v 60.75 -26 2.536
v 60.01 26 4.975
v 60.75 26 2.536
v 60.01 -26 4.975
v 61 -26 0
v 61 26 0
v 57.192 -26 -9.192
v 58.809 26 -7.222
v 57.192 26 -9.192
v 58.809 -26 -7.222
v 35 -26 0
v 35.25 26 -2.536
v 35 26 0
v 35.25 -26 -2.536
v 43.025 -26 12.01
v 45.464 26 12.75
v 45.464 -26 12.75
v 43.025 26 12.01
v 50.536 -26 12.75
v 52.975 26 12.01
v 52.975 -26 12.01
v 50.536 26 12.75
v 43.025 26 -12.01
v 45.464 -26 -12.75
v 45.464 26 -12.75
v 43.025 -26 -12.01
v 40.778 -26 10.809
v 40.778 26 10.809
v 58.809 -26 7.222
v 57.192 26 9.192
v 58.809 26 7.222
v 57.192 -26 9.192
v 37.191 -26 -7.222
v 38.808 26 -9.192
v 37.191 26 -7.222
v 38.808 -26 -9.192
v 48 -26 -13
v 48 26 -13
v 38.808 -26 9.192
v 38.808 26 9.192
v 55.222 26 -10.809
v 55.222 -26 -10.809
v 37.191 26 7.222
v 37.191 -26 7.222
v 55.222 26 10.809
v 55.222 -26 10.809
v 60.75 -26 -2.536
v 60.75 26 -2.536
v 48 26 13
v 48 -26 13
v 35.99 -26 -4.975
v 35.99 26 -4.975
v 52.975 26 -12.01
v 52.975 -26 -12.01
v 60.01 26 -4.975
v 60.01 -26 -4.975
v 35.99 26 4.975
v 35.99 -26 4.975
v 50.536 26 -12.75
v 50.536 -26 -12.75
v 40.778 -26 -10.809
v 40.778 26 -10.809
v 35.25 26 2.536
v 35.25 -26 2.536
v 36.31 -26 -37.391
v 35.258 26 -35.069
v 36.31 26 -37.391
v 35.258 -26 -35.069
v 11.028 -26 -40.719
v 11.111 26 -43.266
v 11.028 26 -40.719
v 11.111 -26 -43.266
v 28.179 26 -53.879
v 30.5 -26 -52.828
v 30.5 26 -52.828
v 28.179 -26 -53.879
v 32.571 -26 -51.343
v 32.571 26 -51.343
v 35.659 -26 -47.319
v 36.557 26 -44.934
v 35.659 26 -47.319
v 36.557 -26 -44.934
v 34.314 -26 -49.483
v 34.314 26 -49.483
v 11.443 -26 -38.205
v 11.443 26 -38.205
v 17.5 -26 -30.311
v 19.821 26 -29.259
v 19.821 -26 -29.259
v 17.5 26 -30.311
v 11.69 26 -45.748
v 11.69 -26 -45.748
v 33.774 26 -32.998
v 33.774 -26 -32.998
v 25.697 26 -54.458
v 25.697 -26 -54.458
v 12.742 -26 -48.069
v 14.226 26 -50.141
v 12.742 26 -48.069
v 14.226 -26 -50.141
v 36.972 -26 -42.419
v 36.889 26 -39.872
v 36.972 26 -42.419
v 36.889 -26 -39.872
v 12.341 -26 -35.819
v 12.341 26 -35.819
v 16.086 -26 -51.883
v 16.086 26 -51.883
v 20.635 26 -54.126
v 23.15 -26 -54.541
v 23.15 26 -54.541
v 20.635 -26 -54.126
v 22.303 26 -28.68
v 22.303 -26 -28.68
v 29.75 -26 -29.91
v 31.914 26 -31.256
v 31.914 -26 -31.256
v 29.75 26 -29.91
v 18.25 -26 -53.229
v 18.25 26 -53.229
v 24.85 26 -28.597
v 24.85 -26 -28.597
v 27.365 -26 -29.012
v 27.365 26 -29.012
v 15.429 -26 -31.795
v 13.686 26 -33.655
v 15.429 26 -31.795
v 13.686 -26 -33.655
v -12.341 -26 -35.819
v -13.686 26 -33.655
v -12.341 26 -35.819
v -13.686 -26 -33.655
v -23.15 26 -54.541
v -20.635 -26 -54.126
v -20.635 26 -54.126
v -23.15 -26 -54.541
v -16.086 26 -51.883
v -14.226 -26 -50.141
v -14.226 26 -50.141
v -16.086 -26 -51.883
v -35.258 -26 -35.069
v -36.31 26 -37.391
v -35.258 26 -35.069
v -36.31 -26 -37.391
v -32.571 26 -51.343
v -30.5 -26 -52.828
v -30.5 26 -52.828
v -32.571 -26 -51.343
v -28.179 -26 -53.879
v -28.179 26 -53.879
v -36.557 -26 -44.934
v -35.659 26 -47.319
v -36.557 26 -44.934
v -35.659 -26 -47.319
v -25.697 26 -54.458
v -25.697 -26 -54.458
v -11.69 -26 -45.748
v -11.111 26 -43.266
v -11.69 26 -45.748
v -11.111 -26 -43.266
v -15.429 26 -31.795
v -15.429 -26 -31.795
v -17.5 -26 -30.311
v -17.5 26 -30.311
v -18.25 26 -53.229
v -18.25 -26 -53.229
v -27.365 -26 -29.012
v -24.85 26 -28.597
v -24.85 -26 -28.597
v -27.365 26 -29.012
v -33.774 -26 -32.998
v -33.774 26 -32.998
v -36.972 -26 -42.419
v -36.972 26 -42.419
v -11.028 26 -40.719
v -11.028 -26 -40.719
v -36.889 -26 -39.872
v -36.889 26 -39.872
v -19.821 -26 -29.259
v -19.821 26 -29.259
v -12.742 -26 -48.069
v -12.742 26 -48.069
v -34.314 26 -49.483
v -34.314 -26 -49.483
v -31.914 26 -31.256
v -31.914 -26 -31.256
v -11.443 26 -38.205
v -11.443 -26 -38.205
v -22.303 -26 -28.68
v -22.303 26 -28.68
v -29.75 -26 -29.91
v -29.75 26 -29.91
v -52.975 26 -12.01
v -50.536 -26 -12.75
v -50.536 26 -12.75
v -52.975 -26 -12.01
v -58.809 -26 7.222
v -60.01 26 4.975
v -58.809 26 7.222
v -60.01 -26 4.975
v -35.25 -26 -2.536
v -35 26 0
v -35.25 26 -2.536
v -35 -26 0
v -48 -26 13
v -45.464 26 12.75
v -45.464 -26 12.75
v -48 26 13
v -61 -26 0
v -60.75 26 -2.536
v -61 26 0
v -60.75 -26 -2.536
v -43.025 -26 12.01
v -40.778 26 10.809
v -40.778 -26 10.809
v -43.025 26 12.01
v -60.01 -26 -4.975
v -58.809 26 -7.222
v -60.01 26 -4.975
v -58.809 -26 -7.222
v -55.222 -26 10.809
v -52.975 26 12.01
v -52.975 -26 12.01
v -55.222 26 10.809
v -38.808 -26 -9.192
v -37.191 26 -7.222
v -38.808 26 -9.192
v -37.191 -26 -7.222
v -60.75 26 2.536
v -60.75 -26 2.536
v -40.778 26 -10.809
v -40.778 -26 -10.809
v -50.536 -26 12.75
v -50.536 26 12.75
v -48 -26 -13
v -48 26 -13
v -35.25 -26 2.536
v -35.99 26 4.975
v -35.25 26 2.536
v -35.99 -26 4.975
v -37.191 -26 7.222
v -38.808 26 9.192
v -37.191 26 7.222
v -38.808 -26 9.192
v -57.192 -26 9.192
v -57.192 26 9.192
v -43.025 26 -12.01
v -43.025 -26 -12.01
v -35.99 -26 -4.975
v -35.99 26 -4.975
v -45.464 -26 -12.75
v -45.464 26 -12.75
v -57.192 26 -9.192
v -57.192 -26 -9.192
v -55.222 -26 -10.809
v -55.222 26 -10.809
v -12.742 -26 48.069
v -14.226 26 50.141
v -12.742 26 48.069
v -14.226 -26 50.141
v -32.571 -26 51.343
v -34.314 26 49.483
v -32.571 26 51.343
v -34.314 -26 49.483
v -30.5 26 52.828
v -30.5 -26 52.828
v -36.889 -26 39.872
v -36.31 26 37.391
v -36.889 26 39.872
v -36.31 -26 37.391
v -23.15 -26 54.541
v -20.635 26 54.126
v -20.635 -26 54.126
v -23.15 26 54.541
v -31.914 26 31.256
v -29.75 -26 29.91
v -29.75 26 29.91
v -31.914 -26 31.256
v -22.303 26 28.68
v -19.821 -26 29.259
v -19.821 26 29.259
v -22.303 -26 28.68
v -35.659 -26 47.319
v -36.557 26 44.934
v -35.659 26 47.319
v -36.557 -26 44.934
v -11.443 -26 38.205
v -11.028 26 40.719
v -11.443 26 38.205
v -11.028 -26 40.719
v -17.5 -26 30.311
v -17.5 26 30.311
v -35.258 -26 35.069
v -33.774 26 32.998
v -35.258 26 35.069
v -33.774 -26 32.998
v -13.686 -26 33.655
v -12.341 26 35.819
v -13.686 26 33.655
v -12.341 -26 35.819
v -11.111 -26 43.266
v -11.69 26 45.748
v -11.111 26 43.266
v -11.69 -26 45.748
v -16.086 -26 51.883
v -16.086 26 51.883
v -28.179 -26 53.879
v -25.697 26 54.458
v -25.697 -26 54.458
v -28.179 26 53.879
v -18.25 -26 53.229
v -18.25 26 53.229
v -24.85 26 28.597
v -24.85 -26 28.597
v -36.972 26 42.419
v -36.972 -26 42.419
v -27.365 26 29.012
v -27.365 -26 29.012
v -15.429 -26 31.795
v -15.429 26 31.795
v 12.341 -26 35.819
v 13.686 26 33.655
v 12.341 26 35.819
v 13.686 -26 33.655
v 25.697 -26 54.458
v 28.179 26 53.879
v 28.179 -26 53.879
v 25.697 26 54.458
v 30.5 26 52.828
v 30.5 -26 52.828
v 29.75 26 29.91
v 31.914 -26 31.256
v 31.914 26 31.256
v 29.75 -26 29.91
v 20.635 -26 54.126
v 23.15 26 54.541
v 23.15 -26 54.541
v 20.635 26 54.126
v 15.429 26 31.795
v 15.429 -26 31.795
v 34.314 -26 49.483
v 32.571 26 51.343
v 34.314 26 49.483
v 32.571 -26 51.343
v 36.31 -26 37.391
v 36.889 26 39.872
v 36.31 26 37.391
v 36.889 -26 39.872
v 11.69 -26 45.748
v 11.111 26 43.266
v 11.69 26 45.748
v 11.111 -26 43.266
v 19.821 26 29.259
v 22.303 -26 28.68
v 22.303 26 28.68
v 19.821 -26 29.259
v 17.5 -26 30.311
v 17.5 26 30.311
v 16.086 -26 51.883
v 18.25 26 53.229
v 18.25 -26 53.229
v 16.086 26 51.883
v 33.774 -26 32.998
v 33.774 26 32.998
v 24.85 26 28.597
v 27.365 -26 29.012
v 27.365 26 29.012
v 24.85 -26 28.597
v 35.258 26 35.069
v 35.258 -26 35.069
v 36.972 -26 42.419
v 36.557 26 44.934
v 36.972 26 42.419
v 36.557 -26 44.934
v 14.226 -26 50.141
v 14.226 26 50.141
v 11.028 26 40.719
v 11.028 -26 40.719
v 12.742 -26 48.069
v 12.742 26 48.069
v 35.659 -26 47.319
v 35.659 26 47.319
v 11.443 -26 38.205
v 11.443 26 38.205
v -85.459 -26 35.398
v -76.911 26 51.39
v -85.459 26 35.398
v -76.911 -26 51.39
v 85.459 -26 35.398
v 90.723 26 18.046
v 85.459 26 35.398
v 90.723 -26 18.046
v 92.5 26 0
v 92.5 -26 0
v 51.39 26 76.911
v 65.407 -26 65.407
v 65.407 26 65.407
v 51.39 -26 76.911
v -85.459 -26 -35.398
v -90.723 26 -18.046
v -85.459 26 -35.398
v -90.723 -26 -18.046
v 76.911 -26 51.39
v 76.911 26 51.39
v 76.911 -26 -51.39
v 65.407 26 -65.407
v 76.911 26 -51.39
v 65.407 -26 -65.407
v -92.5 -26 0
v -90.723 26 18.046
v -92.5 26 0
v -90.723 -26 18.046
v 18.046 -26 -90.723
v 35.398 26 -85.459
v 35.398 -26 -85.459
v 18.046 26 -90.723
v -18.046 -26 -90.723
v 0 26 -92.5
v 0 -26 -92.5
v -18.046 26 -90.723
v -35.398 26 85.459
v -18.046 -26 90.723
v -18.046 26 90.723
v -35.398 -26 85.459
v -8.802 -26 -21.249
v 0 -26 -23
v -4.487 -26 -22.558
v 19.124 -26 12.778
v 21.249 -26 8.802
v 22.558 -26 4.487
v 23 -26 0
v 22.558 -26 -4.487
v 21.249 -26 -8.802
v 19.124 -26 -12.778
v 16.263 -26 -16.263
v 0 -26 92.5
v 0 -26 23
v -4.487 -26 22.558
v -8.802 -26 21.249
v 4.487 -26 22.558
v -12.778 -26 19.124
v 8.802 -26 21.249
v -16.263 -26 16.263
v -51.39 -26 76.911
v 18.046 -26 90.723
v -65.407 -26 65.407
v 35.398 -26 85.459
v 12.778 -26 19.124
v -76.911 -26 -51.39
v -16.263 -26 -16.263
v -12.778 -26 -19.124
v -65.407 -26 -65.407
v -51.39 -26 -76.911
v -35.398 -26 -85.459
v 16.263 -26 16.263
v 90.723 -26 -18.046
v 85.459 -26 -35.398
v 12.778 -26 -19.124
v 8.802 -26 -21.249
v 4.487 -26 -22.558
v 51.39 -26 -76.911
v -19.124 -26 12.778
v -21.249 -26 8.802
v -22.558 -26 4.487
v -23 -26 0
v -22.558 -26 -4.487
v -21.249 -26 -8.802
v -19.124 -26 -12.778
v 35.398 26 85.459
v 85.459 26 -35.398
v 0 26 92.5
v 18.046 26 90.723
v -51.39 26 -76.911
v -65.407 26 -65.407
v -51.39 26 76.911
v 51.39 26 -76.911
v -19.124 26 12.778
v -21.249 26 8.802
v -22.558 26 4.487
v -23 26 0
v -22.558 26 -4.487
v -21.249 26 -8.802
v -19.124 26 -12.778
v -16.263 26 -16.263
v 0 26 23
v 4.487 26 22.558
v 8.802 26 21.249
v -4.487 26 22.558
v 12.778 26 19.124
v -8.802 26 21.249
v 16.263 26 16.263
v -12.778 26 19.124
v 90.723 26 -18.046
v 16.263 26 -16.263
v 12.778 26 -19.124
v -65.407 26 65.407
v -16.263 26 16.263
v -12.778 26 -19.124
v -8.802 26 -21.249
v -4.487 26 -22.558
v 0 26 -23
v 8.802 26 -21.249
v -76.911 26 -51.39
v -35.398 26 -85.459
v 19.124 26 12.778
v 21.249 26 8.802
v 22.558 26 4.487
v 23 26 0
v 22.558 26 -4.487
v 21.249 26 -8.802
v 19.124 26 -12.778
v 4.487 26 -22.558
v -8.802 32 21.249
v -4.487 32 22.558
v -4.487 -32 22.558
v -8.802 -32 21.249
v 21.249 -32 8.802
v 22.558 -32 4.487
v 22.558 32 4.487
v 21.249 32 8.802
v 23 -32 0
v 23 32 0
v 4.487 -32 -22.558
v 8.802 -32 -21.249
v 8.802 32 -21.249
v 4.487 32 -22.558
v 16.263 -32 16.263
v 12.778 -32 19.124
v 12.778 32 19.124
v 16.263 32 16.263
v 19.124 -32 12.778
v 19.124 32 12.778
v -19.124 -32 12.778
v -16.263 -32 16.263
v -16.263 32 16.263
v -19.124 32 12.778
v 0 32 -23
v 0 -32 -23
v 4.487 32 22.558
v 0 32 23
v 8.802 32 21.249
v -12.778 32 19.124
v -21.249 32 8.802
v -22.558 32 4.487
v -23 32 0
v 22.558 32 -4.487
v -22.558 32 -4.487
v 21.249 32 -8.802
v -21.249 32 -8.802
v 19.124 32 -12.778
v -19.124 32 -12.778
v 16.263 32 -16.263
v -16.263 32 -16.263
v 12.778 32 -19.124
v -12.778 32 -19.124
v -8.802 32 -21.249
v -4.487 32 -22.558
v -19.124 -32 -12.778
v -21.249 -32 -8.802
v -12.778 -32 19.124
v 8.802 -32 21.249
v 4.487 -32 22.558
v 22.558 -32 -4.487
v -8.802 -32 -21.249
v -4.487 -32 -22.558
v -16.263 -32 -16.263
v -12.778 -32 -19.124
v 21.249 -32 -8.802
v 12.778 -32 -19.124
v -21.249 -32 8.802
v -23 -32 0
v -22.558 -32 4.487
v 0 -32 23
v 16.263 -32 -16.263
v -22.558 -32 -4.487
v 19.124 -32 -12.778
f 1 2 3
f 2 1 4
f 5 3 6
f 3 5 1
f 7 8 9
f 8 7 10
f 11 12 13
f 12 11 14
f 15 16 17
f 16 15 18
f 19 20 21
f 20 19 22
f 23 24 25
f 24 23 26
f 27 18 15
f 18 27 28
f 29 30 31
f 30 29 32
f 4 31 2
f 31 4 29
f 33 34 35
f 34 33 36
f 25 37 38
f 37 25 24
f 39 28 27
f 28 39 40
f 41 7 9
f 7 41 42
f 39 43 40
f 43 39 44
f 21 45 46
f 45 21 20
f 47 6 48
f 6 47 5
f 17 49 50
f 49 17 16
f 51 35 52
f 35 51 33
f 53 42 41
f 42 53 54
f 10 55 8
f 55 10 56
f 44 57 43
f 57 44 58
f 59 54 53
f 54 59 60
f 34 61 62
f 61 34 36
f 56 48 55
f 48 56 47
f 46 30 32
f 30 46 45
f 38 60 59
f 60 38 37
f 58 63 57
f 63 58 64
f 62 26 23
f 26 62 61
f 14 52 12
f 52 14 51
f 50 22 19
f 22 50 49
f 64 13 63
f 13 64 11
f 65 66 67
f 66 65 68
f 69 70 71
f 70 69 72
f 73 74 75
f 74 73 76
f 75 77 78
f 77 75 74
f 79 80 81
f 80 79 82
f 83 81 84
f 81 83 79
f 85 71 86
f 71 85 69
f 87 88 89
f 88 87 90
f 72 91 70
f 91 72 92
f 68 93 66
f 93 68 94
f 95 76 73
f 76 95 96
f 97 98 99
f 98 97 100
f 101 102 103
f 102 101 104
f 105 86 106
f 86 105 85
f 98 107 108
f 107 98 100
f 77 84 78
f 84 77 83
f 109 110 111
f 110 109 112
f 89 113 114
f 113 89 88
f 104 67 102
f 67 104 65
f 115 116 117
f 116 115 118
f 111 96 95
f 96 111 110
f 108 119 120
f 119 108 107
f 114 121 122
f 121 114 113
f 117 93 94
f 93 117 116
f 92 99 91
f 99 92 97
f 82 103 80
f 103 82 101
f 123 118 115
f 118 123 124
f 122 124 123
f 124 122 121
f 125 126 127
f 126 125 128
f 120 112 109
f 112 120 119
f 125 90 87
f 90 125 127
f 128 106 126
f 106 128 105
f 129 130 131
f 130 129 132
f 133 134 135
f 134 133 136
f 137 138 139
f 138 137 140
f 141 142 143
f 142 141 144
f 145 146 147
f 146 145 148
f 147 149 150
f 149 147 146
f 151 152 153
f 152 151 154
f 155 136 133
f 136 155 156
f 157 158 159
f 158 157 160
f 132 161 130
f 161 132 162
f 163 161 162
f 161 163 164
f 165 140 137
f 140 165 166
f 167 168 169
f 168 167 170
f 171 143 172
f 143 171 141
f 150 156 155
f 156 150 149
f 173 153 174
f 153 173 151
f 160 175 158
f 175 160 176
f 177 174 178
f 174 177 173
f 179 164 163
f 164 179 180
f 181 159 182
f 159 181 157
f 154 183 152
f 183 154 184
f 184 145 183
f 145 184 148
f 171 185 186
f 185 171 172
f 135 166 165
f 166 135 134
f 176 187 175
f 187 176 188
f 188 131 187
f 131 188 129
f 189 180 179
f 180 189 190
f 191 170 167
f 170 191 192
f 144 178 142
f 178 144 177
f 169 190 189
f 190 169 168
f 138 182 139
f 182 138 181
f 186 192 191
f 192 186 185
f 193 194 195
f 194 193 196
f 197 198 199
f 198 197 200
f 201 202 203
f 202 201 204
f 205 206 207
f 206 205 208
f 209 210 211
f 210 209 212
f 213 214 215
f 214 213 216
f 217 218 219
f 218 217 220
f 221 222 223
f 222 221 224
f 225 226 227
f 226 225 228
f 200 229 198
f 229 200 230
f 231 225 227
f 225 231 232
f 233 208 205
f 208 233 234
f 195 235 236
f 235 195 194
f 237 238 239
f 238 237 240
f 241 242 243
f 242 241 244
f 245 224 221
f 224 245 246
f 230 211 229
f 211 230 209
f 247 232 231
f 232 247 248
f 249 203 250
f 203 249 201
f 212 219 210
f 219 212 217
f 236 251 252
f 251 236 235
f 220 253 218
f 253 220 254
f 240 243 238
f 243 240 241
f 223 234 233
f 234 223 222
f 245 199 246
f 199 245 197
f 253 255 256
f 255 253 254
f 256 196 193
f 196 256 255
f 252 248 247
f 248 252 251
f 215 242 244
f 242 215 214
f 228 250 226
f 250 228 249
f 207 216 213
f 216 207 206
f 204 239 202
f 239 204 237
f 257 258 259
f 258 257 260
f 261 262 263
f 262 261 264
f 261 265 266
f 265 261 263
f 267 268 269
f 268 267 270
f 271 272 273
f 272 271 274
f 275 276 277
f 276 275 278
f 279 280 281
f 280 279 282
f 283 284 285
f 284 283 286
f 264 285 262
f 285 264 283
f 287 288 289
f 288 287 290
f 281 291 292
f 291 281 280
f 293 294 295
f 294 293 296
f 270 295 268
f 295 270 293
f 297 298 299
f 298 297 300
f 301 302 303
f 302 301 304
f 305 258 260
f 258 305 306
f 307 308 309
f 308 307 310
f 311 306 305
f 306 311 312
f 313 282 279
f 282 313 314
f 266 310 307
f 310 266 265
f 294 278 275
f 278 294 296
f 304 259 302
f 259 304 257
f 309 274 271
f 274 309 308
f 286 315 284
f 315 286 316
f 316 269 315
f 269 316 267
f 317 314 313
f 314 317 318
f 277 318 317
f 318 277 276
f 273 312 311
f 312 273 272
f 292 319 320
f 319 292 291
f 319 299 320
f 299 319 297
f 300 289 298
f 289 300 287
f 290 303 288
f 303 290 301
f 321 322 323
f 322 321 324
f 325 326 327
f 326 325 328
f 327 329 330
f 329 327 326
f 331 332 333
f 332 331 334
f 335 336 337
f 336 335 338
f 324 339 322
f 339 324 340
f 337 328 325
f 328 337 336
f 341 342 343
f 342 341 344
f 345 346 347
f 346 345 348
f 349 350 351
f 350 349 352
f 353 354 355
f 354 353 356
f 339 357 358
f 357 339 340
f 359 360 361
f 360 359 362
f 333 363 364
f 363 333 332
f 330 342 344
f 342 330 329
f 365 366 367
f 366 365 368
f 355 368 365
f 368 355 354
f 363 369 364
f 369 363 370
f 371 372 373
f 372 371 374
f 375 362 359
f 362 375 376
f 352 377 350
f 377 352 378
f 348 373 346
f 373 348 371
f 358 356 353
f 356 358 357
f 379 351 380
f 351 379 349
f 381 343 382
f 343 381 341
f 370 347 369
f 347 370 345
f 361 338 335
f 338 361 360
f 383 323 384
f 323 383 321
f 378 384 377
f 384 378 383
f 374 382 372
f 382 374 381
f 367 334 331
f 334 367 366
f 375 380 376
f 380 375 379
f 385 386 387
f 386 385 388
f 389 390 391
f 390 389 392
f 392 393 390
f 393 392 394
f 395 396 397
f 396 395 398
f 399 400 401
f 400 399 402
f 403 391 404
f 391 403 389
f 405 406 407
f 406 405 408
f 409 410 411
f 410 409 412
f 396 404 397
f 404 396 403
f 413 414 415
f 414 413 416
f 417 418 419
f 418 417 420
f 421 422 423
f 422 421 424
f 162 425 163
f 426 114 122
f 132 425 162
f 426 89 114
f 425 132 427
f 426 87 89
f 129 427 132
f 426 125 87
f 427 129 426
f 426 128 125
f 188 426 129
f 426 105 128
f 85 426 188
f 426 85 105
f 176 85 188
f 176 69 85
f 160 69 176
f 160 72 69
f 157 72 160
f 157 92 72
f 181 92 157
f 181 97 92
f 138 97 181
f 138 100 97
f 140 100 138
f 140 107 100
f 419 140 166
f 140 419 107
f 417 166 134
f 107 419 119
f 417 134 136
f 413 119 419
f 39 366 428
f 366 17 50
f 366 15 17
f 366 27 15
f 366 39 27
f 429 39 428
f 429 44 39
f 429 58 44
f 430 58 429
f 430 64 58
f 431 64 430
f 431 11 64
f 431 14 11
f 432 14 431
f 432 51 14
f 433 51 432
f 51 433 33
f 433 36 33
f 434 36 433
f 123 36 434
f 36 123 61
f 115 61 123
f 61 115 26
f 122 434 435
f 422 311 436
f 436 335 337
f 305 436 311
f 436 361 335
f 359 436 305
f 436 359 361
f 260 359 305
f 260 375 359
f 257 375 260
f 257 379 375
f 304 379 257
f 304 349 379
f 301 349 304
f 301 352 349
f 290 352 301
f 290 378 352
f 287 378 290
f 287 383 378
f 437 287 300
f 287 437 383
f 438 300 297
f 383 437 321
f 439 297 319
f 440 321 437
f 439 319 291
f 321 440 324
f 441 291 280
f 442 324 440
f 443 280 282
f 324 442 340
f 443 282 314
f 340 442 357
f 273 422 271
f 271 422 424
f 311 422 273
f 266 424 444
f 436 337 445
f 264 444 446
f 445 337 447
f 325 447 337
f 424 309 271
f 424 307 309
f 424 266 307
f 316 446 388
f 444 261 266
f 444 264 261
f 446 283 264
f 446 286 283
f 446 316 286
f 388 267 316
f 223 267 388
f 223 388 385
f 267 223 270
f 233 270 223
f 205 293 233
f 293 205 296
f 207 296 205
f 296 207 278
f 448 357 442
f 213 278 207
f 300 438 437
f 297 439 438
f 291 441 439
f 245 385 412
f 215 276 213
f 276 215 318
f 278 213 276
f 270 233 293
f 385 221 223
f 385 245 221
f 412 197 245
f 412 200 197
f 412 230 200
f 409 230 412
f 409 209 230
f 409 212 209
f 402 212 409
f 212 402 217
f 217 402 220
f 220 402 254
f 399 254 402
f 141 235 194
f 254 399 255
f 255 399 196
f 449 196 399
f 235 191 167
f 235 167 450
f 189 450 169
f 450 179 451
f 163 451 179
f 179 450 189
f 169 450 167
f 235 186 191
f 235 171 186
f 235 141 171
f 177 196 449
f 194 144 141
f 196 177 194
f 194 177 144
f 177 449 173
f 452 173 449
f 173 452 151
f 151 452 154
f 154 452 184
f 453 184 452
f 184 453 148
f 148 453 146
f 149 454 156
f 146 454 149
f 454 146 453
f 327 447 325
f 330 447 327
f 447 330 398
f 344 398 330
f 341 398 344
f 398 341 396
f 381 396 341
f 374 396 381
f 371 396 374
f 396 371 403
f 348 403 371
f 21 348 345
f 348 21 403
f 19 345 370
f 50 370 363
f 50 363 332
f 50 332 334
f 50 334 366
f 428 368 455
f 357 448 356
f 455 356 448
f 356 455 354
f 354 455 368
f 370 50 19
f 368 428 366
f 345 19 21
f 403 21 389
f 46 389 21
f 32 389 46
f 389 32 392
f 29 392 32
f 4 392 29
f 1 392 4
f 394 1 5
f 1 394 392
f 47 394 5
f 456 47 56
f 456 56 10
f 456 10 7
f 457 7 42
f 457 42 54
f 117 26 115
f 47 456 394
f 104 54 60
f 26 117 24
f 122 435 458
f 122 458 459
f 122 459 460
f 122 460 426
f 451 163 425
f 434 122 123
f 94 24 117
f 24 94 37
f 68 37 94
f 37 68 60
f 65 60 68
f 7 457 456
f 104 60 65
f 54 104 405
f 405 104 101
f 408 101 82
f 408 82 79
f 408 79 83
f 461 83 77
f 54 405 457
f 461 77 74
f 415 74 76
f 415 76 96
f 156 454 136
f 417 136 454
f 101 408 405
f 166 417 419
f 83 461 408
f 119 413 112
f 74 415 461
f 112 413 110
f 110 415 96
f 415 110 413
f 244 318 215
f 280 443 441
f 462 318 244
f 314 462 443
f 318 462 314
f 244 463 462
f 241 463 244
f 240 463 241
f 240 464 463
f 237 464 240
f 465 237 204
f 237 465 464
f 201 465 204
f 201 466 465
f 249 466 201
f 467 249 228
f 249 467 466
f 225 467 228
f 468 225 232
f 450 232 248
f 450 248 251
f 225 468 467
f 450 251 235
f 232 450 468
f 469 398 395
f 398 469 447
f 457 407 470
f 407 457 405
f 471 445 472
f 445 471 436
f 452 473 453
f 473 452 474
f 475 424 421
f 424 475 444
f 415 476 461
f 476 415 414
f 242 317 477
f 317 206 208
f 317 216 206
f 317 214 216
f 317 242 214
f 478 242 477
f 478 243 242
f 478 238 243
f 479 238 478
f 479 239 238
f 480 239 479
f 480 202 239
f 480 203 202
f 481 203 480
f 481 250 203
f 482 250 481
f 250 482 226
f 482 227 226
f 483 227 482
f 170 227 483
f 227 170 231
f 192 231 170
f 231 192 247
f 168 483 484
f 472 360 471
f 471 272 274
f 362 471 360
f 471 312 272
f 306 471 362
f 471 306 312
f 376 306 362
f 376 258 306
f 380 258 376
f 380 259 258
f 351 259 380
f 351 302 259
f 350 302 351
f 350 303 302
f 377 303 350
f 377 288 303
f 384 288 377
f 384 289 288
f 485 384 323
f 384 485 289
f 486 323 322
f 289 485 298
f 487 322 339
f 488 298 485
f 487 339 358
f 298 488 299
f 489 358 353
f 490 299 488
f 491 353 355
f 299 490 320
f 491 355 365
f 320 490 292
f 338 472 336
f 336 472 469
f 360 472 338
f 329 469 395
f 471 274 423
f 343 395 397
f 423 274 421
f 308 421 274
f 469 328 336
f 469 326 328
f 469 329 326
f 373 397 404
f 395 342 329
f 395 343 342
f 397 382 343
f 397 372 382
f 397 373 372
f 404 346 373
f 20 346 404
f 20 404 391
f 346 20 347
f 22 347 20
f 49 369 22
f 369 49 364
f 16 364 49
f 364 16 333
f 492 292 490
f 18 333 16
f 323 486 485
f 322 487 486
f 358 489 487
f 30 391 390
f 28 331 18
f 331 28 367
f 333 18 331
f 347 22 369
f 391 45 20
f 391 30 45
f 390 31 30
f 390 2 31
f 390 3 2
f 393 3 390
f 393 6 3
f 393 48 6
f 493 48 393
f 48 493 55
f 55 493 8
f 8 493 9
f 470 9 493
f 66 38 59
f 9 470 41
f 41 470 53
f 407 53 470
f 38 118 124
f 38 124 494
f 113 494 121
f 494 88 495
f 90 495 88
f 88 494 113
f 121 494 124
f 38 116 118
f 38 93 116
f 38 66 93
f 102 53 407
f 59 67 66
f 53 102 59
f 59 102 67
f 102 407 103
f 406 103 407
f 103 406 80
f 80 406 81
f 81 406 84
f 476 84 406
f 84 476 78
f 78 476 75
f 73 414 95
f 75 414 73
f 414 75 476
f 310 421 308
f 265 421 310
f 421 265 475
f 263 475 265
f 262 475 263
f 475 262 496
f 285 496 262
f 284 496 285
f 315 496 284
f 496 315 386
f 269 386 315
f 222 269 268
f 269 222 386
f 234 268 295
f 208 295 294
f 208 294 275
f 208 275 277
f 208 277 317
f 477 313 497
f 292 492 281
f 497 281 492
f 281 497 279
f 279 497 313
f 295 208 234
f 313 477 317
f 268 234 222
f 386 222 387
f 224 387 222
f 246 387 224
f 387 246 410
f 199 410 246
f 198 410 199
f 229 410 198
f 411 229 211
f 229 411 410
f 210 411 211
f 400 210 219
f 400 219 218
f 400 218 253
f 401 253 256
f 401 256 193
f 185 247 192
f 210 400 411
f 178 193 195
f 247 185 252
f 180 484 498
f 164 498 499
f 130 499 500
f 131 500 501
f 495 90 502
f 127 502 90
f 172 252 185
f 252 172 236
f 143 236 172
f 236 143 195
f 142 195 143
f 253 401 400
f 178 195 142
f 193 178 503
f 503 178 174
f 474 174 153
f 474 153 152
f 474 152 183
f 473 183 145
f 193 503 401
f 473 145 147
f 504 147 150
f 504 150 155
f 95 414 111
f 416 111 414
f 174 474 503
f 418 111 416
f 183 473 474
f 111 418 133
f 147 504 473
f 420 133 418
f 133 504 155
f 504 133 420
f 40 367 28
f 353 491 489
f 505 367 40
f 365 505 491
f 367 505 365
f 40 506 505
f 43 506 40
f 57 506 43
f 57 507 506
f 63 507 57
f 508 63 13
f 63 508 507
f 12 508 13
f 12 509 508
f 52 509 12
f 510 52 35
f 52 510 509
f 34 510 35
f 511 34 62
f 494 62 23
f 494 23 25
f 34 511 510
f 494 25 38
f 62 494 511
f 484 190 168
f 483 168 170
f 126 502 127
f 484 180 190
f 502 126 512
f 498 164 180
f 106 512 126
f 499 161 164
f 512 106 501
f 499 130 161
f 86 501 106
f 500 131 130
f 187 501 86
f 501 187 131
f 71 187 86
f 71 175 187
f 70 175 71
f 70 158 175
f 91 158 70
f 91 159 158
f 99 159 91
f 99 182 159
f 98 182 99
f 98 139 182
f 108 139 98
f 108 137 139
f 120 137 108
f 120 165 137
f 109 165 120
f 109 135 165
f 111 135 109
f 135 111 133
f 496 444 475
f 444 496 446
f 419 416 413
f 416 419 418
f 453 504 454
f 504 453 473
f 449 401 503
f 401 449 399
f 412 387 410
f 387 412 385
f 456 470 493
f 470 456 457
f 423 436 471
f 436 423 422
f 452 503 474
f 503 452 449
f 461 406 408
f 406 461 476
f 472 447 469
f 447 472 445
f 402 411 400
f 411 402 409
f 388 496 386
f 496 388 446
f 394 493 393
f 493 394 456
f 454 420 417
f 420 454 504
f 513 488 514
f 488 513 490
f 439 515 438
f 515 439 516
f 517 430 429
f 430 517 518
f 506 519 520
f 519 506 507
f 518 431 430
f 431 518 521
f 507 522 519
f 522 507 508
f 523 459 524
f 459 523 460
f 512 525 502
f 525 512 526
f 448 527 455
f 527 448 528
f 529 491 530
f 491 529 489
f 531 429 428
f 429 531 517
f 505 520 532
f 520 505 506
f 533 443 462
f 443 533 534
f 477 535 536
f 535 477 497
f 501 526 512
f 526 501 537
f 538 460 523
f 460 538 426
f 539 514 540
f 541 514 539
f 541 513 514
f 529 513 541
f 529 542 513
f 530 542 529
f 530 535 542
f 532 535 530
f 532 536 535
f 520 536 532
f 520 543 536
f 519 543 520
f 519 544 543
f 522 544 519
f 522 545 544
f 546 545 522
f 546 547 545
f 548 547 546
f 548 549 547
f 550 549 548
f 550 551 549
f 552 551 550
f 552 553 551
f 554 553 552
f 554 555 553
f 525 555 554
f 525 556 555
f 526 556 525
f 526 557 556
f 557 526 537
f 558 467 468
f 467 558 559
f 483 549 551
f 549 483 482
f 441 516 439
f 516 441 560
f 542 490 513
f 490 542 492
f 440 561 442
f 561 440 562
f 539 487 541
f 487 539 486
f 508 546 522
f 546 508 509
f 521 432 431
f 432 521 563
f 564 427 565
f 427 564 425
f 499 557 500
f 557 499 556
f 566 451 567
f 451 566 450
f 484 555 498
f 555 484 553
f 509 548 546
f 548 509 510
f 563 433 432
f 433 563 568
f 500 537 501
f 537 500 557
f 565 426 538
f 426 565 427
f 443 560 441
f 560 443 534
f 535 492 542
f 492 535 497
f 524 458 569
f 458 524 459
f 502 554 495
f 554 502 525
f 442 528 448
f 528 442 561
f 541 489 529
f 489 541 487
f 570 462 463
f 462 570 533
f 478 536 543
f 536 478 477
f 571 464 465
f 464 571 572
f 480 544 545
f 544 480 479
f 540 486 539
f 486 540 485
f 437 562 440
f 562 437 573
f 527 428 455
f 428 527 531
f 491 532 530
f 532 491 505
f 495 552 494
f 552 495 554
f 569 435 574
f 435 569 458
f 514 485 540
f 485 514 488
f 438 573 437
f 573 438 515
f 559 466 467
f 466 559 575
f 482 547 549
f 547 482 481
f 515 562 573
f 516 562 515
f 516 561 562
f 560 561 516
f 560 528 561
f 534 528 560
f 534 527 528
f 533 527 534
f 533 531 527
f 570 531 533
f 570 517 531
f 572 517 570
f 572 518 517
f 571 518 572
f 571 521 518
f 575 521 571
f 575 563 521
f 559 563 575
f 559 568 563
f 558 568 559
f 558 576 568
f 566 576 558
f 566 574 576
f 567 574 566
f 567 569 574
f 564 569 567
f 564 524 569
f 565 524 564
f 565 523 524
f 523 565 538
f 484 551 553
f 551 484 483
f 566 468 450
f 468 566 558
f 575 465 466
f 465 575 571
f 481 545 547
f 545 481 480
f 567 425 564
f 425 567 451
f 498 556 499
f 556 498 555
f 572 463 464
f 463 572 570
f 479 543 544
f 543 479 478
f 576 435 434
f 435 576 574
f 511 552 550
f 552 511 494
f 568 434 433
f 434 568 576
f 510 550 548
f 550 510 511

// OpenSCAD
use <main.scad>
drive_wheel_diameter = 220;
drive_wheel_radius   = 110;
drive_wheel_width    = 60;
drive_wheel_track    = 620;
drive_wheel_axle_z   = 110;
show_component_labels = false;
translate([0, drive_wheel_track / 2, -drive_wheel_axle_z])
    drive_wheel_hub(-1, 0);
